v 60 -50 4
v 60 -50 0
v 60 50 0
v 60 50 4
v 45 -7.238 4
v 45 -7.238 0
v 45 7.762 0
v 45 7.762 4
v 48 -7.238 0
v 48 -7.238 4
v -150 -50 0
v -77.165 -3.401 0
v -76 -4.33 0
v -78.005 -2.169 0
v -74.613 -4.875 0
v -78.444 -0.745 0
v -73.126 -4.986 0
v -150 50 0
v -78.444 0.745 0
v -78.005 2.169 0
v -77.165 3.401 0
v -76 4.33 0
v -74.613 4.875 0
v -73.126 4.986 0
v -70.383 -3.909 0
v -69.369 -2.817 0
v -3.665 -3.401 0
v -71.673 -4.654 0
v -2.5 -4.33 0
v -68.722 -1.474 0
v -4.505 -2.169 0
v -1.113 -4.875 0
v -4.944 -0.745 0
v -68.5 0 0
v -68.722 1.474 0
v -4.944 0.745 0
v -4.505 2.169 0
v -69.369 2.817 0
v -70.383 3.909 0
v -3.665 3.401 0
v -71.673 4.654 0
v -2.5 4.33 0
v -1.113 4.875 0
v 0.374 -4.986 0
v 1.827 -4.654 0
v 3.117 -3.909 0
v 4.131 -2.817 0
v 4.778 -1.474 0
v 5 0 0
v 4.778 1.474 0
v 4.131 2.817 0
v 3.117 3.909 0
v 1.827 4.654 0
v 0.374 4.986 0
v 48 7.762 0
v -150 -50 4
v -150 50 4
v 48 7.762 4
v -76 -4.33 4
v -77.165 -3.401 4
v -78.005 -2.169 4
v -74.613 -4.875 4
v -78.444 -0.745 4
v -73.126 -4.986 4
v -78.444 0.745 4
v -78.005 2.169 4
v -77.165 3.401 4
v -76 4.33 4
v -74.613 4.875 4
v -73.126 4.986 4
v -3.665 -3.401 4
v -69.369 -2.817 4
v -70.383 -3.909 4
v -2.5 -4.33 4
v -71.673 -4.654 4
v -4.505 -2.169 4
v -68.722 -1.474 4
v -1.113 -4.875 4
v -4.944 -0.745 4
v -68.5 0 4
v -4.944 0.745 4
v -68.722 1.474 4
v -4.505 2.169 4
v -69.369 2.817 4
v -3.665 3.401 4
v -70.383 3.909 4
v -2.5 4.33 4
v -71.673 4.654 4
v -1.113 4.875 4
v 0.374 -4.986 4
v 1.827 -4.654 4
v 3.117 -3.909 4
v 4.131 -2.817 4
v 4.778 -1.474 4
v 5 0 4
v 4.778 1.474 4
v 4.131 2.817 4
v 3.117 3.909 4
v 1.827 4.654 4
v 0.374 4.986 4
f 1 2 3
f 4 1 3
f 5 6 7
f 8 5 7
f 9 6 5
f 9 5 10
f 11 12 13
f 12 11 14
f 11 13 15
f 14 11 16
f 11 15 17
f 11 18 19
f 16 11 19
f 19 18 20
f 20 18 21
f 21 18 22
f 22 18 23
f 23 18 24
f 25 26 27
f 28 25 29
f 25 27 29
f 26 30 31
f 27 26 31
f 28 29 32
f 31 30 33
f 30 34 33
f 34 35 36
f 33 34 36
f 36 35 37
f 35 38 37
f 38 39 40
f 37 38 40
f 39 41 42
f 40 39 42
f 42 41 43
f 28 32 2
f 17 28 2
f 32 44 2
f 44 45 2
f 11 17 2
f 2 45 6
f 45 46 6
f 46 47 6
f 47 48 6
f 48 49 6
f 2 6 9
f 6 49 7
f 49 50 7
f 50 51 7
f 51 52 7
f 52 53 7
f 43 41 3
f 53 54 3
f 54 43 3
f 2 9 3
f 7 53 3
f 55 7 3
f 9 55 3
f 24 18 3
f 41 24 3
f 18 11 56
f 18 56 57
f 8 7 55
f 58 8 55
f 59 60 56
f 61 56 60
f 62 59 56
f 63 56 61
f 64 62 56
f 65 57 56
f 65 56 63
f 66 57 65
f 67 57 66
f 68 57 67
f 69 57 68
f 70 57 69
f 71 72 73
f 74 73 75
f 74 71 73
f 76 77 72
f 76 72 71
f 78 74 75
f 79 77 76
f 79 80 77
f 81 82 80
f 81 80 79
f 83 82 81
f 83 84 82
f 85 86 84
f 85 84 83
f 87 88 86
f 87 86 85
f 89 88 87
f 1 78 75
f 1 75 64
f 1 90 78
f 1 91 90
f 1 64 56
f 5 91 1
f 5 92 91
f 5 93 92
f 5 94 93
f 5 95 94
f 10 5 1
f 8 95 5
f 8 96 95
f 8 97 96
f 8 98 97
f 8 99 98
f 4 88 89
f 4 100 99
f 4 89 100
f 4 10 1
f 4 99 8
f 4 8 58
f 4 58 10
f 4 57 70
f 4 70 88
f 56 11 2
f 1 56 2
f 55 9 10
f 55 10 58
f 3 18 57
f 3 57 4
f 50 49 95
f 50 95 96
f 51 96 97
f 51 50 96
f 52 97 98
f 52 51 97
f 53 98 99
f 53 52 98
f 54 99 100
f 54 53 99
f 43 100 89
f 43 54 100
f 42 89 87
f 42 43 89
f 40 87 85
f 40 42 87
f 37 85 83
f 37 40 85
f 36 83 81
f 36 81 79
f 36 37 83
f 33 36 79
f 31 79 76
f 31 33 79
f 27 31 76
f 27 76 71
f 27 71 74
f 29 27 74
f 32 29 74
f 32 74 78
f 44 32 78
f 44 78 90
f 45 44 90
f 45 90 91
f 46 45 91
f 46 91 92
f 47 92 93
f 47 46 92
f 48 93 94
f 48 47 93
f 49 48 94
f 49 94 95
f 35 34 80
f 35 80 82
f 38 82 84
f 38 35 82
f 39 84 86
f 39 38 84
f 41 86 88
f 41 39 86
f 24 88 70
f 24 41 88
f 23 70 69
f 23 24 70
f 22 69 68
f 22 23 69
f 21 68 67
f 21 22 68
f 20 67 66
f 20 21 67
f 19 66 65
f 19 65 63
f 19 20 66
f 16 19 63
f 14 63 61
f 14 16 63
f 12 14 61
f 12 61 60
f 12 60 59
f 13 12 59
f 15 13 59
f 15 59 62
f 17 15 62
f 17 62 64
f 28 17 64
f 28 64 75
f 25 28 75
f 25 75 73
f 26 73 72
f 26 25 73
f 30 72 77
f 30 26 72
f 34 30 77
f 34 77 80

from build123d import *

# Parameters (mm, degrees)
SKETCH1_W           = 210
SKETCH1_H           = 100
SKETCH1_R           = 5
SKETCH1_W_2         = 3
SKETCH1_H_2         = 15
BOSS_EXTRUDE1_DEPTH = 4


with BuildPart() as part:
    # Sketch1 → Boss-Extrude1 (new body)
    with BuildSketch(Plane.XY):
        with Locations((-45, 0)):
            Rectangle(SKETCH1_W, SKETCH1_H)
        Circle(SKETCH1_R, mode=Mode.SUBTRACT)
        with Locations((-73.5, 0)):
            Circle(SKETCH1_R, mode=Mode.SUBTRACT)
        with Locations((46.5, 0.26206532)):
            Rectangle(SKETCH1_W_2, SKETCH1_H_2, mode=Mode.SUBTRACT)
    extrude(amount=BOSS_EXTRUDE1_DEPTH)


solid = part.part
